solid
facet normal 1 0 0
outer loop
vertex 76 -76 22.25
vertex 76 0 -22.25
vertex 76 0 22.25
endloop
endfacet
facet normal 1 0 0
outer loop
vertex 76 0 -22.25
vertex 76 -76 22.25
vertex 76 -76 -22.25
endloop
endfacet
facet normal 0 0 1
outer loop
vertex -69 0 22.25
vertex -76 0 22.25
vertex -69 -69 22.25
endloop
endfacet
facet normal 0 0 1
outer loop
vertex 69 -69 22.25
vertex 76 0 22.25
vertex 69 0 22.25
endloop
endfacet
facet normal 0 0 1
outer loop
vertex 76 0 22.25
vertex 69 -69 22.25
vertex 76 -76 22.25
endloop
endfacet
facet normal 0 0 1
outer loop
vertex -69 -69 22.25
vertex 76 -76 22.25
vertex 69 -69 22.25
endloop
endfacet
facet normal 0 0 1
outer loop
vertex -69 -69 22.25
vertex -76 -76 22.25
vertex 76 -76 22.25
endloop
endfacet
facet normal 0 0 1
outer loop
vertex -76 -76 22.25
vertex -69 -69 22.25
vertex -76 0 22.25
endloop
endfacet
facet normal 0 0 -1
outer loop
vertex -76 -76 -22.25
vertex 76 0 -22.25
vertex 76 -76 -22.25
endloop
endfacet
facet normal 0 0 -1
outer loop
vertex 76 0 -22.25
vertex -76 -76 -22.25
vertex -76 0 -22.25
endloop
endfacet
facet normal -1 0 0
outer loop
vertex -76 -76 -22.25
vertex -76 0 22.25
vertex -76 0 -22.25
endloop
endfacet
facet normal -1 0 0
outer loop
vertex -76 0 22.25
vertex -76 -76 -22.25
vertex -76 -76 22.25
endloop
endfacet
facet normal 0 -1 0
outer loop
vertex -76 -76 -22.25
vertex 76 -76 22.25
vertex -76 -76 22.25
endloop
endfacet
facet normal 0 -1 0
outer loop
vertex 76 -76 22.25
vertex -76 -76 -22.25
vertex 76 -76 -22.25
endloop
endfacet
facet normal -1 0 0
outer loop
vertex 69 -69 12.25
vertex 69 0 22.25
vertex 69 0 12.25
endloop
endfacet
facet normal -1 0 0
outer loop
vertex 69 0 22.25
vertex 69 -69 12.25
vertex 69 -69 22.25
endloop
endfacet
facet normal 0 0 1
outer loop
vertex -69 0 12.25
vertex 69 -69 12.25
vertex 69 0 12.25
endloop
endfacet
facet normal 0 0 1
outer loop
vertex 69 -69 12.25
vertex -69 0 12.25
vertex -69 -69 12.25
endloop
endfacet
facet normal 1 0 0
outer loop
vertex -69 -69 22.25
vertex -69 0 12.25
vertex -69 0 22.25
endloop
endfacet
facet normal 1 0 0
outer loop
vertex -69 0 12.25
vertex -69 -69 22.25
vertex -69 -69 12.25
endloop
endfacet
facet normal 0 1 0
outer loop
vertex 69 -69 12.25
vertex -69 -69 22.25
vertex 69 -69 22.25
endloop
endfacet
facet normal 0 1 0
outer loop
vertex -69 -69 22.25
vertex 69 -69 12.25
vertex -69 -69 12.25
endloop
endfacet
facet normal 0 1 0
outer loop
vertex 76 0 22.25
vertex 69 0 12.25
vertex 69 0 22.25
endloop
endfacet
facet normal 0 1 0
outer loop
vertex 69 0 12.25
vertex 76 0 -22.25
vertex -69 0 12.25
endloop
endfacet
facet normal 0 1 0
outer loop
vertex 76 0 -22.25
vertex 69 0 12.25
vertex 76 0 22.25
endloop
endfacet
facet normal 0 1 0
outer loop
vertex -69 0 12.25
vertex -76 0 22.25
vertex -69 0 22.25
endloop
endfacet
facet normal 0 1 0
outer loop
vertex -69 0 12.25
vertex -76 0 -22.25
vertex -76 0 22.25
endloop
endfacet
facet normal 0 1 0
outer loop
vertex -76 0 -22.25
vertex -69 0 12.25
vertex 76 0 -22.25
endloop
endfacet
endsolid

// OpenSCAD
/*
 * fence post top
 */



$fn=120;

outside_length = 152;
outside_height = 44.5;

inside_length = 138;
inside_depth = 10;

module base_cube() {
    cube([outside_length, outside_length, outside_height], center = true);
}

module cutout() {
    cube([inside_length, inside_length, inside_depth], center = true);
}

module cutout_cube() {
    difference() {
        base_cube();
        translate([0, 0, (outside_height - inside_depth)/2])
            cutout();
    }
}

module half_cube() {
    difference() {
        cutout_cube();
        translate([0,outside_length/2, 0]) base_cube();
    }
}

half_cube();
